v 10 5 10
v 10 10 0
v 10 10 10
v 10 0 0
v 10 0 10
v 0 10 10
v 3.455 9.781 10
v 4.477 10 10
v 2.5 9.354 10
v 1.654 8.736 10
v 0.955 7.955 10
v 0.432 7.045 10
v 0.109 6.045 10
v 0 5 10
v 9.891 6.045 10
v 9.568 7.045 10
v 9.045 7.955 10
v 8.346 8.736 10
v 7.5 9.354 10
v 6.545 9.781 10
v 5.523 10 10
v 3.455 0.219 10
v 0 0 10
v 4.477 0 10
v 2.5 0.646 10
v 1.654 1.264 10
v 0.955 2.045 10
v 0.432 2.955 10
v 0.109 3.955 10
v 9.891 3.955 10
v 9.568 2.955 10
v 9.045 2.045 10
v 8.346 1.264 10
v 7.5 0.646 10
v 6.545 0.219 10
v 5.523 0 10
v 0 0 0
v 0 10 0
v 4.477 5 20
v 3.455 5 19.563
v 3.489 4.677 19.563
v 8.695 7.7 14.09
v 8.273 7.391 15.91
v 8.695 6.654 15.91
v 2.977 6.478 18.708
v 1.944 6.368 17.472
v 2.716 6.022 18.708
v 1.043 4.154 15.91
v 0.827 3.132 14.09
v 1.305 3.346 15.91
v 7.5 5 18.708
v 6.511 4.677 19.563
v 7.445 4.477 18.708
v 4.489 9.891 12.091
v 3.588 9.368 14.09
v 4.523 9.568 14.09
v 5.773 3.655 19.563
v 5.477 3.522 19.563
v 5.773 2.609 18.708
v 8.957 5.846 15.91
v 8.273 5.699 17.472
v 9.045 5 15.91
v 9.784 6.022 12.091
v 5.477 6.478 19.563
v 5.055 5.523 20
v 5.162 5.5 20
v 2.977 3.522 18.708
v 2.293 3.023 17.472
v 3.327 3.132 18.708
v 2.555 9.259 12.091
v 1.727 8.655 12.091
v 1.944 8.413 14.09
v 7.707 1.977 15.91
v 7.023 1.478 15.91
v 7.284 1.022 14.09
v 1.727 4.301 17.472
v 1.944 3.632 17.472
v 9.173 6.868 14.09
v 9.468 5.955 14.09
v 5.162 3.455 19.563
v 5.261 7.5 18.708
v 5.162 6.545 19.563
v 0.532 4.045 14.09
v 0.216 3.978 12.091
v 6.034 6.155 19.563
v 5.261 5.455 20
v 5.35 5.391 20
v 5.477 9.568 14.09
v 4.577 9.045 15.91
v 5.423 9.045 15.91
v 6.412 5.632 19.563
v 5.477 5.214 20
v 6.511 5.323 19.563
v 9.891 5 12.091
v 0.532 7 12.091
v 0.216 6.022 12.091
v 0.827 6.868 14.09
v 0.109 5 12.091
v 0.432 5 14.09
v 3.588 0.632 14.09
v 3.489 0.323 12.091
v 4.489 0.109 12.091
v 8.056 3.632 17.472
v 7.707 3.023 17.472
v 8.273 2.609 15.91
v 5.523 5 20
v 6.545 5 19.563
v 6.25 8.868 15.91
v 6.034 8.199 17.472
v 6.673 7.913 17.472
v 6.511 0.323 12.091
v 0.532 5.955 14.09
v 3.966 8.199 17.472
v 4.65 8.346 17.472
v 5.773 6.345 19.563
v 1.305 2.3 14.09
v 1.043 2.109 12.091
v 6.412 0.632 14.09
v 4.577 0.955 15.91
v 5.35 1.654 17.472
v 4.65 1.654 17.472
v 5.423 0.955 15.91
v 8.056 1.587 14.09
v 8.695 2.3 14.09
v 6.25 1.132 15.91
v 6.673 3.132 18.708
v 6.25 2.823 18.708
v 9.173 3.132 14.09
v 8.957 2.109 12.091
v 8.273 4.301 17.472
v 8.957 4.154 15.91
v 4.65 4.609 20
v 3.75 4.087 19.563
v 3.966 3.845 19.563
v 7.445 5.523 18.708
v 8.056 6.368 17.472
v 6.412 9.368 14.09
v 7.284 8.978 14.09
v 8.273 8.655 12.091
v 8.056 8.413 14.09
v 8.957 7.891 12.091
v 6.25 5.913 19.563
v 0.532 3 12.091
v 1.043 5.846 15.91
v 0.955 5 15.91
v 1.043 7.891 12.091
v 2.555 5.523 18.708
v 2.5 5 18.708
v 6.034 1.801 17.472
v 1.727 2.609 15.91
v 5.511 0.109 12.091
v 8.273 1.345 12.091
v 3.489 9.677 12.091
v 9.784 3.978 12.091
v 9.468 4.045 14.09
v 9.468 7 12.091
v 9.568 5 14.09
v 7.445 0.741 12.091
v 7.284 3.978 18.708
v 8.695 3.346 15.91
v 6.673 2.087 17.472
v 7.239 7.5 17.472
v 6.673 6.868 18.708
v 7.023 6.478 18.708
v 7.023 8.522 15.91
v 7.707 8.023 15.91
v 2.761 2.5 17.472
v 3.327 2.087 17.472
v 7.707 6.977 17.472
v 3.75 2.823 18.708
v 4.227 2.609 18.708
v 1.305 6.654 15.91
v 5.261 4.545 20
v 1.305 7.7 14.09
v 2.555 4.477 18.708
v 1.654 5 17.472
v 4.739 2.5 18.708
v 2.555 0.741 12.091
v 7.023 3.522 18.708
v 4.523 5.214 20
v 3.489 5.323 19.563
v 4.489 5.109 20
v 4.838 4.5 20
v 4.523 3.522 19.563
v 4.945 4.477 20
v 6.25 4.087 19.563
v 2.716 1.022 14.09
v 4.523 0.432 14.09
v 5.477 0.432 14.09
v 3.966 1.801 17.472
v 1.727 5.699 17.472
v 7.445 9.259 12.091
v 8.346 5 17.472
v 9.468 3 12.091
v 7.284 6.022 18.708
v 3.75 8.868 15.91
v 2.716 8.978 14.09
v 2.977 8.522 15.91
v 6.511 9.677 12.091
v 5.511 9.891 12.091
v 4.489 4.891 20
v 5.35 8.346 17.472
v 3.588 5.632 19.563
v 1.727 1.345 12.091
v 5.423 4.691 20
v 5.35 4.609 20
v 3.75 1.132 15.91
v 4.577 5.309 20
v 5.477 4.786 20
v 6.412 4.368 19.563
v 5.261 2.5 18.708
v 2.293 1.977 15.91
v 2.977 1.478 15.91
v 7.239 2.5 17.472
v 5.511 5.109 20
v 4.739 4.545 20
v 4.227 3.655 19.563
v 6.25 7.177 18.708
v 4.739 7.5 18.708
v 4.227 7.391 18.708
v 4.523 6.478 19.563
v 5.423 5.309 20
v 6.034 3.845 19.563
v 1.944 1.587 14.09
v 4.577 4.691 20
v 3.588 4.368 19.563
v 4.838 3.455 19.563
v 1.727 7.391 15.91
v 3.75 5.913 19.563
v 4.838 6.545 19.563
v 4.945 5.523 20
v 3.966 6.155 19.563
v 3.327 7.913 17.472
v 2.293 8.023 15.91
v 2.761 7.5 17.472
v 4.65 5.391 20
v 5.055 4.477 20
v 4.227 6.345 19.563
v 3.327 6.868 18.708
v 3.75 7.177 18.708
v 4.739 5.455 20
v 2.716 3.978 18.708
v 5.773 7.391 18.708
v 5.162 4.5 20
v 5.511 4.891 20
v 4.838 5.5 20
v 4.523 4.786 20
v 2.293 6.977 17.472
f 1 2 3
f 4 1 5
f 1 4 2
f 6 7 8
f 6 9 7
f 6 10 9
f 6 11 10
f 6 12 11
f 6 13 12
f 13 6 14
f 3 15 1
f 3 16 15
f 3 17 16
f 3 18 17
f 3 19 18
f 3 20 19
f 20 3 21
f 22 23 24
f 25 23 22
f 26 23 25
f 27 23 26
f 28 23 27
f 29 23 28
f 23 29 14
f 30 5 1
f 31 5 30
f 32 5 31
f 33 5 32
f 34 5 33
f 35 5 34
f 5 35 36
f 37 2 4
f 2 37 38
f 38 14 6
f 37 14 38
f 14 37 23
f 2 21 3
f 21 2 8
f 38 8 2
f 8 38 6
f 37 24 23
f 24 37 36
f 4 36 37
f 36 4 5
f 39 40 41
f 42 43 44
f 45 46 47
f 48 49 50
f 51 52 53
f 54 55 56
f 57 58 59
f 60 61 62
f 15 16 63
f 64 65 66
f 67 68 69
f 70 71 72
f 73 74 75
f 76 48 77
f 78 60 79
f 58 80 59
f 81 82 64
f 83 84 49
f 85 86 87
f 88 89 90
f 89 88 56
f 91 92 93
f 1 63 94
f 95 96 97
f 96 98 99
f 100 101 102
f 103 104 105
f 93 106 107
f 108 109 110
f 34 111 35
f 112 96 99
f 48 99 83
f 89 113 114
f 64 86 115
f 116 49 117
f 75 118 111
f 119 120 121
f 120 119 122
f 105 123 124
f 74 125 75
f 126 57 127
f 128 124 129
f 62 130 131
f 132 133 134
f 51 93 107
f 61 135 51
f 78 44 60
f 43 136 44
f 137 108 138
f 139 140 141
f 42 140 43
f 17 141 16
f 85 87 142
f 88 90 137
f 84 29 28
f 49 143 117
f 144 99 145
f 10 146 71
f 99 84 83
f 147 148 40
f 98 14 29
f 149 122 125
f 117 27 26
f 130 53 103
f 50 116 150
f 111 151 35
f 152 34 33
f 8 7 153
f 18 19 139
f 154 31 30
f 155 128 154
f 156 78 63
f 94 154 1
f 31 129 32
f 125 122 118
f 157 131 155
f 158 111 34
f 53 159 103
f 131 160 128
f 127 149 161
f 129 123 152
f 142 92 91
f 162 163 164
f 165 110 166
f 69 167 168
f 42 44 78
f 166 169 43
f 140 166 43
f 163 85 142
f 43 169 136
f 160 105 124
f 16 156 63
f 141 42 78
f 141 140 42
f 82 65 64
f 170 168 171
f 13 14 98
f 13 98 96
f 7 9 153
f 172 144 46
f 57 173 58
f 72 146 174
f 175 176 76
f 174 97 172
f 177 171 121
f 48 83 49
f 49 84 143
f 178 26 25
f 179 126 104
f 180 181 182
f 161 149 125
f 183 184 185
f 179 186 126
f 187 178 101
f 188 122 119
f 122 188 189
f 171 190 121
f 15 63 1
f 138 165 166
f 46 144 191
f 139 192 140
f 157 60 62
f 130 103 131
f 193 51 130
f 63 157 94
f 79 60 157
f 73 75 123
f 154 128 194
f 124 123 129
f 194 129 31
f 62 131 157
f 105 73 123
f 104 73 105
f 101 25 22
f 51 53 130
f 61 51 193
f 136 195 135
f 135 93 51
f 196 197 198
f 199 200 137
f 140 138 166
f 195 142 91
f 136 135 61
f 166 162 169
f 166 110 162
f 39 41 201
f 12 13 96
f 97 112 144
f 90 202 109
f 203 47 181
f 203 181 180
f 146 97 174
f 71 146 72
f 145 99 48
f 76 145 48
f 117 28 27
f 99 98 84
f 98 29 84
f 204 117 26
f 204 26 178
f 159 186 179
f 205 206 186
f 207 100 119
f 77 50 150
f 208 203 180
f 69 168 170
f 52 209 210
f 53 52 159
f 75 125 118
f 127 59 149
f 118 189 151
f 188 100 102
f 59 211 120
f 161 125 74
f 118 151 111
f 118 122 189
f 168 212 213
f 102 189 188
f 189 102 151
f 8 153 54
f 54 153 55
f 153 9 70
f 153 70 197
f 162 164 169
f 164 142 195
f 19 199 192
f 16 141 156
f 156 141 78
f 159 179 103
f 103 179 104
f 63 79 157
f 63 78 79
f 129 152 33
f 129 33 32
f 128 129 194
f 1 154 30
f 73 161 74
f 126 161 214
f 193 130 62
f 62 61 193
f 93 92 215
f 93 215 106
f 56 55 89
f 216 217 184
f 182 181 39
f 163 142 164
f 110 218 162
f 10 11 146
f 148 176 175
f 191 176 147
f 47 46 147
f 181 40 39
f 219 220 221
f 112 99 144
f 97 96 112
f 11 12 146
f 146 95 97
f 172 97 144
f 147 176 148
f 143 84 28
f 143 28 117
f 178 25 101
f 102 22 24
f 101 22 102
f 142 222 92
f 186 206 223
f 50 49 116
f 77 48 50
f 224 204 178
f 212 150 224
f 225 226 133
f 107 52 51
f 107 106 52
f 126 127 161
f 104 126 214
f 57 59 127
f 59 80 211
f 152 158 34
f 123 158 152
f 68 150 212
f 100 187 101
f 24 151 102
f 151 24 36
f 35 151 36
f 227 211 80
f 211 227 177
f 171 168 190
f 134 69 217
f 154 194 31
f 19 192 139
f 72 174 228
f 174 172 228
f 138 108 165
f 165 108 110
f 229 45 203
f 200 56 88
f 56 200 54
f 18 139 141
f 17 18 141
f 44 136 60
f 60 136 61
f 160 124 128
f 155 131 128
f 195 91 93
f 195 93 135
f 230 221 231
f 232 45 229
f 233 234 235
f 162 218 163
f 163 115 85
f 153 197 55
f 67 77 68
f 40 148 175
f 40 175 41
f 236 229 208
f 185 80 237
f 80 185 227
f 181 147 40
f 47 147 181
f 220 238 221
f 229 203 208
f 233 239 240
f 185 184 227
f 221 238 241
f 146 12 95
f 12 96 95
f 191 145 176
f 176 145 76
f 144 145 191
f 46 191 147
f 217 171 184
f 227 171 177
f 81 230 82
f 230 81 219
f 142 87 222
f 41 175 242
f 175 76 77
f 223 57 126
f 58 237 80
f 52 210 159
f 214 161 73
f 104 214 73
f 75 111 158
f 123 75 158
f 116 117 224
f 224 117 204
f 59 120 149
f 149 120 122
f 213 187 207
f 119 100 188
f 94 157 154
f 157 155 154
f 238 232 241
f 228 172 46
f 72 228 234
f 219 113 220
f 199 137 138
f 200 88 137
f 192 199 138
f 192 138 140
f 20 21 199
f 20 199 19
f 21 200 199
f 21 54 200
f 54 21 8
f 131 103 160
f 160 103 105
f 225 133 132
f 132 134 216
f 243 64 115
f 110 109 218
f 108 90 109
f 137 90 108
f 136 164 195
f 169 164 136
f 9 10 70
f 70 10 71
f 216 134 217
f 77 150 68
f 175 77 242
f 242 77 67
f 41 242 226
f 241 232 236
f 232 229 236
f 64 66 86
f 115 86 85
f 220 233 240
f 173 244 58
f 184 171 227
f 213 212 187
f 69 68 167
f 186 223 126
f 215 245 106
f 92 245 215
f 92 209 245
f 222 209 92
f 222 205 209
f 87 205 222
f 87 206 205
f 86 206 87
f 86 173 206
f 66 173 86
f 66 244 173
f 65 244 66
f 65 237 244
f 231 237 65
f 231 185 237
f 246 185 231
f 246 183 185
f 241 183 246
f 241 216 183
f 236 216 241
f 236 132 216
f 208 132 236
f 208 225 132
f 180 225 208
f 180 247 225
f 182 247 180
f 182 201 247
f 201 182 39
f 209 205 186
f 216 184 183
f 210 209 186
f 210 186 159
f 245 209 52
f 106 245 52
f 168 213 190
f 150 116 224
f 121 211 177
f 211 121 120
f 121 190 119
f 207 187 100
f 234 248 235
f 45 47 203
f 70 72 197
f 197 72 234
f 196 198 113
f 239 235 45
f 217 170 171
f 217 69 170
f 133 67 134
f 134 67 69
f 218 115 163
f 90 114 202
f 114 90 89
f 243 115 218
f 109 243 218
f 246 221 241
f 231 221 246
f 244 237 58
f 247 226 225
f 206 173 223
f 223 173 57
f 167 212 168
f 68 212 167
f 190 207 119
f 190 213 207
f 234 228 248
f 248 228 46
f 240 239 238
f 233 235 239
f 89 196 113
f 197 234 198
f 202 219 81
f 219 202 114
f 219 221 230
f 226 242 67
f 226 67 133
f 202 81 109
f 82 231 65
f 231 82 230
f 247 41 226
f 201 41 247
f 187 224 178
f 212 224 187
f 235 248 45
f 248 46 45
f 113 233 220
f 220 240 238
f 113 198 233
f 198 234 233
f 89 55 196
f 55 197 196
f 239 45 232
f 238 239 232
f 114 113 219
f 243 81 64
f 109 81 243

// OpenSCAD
// file: partsScad.scad
/*This is a module for openscad to be able to output multiple parts
It pairs with a python script that actually managed the multi-output.
*/
multiPartOutput=false;
multiPartFirstrun=false;
multiPartBuildmode="default";

module part(partName,c=undef,buildmode="default"){
    if (multiPartFirstrun){
        echo("Defined new part ---", partName);
        echo("Color ---", partName, c);
    }
    if (buildmode==multiPartBuildmode){
        if (!multiPartOutput) color(c=c)children();
        if (multiPartOutput==partName) color(c=c)children();
    }
}
// main file
use <partsScad.scad>;
multiPartOutput=true;
multiPartFirstrun=true;

part("rube.stl",c="red",buildmode="default"){
    cube([10,10,10]);
}

translate([5,5,10])
part("blegg.stl",c="blue",buildmode="default"){
    resize([10,10,20])sphere(r=10);
}
